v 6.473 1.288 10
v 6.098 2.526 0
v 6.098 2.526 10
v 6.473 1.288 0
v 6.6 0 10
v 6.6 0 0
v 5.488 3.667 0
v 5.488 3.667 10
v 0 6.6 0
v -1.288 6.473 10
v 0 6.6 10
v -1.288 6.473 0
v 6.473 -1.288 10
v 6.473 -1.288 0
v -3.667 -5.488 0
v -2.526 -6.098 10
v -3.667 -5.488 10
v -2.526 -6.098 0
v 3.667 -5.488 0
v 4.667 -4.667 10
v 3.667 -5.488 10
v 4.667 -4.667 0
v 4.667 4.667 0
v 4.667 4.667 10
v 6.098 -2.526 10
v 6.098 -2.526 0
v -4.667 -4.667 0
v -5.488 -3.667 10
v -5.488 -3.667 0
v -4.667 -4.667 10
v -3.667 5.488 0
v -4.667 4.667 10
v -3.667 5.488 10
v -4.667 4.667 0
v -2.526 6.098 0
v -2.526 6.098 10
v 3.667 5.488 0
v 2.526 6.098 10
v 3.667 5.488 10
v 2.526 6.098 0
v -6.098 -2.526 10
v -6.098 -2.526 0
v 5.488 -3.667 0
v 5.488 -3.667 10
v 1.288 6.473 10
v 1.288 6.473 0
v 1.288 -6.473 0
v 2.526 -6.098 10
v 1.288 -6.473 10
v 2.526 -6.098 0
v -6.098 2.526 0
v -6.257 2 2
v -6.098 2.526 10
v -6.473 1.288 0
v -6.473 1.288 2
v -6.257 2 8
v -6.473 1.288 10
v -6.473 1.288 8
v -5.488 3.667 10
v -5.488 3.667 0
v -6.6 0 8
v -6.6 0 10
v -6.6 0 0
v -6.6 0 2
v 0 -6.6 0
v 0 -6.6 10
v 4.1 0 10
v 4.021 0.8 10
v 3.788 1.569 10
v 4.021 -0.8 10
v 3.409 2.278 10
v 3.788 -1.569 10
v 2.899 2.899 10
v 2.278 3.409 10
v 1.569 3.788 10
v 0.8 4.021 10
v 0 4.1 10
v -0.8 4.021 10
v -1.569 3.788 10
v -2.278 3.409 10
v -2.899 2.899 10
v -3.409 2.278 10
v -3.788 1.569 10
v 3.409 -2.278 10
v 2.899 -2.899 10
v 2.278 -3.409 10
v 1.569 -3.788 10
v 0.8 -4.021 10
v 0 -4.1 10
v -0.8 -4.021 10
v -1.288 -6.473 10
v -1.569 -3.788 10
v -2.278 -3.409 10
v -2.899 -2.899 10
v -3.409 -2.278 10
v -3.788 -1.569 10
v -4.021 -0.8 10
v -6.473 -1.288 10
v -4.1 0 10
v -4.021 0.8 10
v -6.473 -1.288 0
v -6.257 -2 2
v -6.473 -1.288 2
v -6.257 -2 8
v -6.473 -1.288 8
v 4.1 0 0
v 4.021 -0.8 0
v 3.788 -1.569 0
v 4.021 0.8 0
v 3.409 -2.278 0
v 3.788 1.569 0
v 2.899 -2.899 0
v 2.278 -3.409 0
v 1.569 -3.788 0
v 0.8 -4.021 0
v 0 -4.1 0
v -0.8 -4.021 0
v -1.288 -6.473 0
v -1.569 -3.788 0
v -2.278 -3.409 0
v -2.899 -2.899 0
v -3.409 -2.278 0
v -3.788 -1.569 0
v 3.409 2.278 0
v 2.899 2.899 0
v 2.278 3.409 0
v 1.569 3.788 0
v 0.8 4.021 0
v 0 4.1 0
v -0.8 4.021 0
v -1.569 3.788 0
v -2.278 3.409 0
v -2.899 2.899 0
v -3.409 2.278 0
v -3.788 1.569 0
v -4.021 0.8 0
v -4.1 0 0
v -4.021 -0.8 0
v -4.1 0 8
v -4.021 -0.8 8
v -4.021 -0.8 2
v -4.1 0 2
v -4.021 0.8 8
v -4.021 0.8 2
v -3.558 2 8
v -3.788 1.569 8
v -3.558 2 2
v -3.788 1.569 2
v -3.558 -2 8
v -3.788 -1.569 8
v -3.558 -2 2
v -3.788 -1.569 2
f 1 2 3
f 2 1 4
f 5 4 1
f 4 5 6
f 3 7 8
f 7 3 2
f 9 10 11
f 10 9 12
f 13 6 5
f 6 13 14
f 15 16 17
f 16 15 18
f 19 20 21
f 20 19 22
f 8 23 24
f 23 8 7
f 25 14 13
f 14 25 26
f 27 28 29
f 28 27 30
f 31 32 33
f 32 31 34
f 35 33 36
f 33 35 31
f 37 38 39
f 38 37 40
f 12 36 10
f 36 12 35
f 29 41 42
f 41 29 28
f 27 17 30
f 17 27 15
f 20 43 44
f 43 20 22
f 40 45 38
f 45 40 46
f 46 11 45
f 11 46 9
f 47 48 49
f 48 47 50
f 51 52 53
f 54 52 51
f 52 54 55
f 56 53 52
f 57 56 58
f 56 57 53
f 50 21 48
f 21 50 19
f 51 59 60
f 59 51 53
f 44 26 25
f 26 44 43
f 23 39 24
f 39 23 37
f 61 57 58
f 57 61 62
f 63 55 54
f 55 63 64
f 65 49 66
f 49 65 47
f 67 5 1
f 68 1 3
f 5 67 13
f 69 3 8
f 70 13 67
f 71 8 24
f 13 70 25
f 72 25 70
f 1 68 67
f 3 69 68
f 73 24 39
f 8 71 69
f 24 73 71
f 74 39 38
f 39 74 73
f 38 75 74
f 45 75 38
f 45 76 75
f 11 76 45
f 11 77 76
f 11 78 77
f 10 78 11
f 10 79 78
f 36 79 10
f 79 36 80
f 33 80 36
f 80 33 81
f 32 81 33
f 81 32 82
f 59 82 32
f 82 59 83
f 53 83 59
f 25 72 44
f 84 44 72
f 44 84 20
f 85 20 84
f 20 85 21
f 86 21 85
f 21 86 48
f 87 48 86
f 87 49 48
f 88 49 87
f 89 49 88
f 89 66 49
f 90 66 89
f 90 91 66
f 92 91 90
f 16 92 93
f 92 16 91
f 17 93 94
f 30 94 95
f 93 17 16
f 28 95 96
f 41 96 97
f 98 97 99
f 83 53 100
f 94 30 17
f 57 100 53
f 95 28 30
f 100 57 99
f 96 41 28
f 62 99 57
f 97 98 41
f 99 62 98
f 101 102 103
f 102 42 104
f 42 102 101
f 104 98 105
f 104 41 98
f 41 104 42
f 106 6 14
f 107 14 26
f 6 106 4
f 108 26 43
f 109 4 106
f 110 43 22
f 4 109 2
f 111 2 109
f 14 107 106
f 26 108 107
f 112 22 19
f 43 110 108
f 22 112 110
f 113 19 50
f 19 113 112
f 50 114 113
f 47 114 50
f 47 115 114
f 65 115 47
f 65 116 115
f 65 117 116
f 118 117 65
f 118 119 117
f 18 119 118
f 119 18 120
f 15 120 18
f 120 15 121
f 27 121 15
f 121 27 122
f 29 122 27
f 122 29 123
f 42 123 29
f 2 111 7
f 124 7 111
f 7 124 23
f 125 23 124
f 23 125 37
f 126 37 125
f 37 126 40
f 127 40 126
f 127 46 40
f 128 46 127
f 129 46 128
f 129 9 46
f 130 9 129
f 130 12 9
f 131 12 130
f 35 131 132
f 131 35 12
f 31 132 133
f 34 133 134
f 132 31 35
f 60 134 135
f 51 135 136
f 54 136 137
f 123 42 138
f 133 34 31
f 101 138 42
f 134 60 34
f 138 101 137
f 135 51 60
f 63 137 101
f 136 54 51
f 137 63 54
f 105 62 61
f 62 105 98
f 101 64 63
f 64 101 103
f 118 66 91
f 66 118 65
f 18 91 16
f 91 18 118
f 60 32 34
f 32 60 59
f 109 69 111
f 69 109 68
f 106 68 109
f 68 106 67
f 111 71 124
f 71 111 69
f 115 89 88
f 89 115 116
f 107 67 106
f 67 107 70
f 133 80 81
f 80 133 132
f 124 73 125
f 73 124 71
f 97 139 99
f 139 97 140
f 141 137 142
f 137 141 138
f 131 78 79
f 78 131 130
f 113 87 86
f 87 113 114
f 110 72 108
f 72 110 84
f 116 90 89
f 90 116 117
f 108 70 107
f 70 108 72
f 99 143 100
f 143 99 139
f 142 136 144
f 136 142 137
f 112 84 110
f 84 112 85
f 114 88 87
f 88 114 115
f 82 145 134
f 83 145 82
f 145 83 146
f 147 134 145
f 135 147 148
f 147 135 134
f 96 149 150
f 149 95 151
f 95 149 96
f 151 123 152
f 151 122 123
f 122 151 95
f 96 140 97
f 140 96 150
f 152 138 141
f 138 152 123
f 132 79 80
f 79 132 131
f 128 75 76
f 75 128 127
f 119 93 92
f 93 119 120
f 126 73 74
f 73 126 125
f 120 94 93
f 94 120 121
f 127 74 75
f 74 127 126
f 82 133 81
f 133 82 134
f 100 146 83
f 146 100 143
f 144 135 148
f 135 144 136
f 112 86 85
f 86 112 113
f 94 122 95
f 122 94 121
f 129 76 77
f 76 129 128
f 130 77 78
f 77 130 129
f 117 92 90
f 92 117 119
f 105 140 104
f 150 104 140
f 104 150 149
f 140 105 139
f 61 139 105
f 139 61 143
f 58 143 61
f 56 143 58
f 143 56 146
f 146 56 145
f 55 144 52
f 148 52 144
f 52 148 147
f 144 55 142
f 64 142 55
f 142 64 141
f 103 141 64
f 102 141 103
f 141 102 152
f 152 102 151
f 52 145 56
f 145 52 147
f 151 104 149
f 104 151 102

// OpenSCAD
$fn = 32;

// ----------------------------------------------------------------------
// Spacer sleeve: 13.2 / 8.2 x 10 mm
// ----------------------------------------------------------------------

// --- parameters (mm) ---
tube_d = 13.2;            // outside diameter
bore_d = 8.2;             // shaft bore
tube_l = 10;              // sleeve length
slot_w = 4;               // clamp slot width
slot_len = 6;             // clamp slot length

module sleeve() {
  cylinder(h = tube_l, d = tube_d);
}

difference() {
  sleeve();
  translate([0, 0, -1]) cylinder(h = tube_l + 2, d = bore_d);
  translate([-tube_d / 2 - 1, -slot_w / 2, tube_l / 2 - slot_len / 2]) cube([tube_d / 2 + 1, slot_w, slot_len]);
}
